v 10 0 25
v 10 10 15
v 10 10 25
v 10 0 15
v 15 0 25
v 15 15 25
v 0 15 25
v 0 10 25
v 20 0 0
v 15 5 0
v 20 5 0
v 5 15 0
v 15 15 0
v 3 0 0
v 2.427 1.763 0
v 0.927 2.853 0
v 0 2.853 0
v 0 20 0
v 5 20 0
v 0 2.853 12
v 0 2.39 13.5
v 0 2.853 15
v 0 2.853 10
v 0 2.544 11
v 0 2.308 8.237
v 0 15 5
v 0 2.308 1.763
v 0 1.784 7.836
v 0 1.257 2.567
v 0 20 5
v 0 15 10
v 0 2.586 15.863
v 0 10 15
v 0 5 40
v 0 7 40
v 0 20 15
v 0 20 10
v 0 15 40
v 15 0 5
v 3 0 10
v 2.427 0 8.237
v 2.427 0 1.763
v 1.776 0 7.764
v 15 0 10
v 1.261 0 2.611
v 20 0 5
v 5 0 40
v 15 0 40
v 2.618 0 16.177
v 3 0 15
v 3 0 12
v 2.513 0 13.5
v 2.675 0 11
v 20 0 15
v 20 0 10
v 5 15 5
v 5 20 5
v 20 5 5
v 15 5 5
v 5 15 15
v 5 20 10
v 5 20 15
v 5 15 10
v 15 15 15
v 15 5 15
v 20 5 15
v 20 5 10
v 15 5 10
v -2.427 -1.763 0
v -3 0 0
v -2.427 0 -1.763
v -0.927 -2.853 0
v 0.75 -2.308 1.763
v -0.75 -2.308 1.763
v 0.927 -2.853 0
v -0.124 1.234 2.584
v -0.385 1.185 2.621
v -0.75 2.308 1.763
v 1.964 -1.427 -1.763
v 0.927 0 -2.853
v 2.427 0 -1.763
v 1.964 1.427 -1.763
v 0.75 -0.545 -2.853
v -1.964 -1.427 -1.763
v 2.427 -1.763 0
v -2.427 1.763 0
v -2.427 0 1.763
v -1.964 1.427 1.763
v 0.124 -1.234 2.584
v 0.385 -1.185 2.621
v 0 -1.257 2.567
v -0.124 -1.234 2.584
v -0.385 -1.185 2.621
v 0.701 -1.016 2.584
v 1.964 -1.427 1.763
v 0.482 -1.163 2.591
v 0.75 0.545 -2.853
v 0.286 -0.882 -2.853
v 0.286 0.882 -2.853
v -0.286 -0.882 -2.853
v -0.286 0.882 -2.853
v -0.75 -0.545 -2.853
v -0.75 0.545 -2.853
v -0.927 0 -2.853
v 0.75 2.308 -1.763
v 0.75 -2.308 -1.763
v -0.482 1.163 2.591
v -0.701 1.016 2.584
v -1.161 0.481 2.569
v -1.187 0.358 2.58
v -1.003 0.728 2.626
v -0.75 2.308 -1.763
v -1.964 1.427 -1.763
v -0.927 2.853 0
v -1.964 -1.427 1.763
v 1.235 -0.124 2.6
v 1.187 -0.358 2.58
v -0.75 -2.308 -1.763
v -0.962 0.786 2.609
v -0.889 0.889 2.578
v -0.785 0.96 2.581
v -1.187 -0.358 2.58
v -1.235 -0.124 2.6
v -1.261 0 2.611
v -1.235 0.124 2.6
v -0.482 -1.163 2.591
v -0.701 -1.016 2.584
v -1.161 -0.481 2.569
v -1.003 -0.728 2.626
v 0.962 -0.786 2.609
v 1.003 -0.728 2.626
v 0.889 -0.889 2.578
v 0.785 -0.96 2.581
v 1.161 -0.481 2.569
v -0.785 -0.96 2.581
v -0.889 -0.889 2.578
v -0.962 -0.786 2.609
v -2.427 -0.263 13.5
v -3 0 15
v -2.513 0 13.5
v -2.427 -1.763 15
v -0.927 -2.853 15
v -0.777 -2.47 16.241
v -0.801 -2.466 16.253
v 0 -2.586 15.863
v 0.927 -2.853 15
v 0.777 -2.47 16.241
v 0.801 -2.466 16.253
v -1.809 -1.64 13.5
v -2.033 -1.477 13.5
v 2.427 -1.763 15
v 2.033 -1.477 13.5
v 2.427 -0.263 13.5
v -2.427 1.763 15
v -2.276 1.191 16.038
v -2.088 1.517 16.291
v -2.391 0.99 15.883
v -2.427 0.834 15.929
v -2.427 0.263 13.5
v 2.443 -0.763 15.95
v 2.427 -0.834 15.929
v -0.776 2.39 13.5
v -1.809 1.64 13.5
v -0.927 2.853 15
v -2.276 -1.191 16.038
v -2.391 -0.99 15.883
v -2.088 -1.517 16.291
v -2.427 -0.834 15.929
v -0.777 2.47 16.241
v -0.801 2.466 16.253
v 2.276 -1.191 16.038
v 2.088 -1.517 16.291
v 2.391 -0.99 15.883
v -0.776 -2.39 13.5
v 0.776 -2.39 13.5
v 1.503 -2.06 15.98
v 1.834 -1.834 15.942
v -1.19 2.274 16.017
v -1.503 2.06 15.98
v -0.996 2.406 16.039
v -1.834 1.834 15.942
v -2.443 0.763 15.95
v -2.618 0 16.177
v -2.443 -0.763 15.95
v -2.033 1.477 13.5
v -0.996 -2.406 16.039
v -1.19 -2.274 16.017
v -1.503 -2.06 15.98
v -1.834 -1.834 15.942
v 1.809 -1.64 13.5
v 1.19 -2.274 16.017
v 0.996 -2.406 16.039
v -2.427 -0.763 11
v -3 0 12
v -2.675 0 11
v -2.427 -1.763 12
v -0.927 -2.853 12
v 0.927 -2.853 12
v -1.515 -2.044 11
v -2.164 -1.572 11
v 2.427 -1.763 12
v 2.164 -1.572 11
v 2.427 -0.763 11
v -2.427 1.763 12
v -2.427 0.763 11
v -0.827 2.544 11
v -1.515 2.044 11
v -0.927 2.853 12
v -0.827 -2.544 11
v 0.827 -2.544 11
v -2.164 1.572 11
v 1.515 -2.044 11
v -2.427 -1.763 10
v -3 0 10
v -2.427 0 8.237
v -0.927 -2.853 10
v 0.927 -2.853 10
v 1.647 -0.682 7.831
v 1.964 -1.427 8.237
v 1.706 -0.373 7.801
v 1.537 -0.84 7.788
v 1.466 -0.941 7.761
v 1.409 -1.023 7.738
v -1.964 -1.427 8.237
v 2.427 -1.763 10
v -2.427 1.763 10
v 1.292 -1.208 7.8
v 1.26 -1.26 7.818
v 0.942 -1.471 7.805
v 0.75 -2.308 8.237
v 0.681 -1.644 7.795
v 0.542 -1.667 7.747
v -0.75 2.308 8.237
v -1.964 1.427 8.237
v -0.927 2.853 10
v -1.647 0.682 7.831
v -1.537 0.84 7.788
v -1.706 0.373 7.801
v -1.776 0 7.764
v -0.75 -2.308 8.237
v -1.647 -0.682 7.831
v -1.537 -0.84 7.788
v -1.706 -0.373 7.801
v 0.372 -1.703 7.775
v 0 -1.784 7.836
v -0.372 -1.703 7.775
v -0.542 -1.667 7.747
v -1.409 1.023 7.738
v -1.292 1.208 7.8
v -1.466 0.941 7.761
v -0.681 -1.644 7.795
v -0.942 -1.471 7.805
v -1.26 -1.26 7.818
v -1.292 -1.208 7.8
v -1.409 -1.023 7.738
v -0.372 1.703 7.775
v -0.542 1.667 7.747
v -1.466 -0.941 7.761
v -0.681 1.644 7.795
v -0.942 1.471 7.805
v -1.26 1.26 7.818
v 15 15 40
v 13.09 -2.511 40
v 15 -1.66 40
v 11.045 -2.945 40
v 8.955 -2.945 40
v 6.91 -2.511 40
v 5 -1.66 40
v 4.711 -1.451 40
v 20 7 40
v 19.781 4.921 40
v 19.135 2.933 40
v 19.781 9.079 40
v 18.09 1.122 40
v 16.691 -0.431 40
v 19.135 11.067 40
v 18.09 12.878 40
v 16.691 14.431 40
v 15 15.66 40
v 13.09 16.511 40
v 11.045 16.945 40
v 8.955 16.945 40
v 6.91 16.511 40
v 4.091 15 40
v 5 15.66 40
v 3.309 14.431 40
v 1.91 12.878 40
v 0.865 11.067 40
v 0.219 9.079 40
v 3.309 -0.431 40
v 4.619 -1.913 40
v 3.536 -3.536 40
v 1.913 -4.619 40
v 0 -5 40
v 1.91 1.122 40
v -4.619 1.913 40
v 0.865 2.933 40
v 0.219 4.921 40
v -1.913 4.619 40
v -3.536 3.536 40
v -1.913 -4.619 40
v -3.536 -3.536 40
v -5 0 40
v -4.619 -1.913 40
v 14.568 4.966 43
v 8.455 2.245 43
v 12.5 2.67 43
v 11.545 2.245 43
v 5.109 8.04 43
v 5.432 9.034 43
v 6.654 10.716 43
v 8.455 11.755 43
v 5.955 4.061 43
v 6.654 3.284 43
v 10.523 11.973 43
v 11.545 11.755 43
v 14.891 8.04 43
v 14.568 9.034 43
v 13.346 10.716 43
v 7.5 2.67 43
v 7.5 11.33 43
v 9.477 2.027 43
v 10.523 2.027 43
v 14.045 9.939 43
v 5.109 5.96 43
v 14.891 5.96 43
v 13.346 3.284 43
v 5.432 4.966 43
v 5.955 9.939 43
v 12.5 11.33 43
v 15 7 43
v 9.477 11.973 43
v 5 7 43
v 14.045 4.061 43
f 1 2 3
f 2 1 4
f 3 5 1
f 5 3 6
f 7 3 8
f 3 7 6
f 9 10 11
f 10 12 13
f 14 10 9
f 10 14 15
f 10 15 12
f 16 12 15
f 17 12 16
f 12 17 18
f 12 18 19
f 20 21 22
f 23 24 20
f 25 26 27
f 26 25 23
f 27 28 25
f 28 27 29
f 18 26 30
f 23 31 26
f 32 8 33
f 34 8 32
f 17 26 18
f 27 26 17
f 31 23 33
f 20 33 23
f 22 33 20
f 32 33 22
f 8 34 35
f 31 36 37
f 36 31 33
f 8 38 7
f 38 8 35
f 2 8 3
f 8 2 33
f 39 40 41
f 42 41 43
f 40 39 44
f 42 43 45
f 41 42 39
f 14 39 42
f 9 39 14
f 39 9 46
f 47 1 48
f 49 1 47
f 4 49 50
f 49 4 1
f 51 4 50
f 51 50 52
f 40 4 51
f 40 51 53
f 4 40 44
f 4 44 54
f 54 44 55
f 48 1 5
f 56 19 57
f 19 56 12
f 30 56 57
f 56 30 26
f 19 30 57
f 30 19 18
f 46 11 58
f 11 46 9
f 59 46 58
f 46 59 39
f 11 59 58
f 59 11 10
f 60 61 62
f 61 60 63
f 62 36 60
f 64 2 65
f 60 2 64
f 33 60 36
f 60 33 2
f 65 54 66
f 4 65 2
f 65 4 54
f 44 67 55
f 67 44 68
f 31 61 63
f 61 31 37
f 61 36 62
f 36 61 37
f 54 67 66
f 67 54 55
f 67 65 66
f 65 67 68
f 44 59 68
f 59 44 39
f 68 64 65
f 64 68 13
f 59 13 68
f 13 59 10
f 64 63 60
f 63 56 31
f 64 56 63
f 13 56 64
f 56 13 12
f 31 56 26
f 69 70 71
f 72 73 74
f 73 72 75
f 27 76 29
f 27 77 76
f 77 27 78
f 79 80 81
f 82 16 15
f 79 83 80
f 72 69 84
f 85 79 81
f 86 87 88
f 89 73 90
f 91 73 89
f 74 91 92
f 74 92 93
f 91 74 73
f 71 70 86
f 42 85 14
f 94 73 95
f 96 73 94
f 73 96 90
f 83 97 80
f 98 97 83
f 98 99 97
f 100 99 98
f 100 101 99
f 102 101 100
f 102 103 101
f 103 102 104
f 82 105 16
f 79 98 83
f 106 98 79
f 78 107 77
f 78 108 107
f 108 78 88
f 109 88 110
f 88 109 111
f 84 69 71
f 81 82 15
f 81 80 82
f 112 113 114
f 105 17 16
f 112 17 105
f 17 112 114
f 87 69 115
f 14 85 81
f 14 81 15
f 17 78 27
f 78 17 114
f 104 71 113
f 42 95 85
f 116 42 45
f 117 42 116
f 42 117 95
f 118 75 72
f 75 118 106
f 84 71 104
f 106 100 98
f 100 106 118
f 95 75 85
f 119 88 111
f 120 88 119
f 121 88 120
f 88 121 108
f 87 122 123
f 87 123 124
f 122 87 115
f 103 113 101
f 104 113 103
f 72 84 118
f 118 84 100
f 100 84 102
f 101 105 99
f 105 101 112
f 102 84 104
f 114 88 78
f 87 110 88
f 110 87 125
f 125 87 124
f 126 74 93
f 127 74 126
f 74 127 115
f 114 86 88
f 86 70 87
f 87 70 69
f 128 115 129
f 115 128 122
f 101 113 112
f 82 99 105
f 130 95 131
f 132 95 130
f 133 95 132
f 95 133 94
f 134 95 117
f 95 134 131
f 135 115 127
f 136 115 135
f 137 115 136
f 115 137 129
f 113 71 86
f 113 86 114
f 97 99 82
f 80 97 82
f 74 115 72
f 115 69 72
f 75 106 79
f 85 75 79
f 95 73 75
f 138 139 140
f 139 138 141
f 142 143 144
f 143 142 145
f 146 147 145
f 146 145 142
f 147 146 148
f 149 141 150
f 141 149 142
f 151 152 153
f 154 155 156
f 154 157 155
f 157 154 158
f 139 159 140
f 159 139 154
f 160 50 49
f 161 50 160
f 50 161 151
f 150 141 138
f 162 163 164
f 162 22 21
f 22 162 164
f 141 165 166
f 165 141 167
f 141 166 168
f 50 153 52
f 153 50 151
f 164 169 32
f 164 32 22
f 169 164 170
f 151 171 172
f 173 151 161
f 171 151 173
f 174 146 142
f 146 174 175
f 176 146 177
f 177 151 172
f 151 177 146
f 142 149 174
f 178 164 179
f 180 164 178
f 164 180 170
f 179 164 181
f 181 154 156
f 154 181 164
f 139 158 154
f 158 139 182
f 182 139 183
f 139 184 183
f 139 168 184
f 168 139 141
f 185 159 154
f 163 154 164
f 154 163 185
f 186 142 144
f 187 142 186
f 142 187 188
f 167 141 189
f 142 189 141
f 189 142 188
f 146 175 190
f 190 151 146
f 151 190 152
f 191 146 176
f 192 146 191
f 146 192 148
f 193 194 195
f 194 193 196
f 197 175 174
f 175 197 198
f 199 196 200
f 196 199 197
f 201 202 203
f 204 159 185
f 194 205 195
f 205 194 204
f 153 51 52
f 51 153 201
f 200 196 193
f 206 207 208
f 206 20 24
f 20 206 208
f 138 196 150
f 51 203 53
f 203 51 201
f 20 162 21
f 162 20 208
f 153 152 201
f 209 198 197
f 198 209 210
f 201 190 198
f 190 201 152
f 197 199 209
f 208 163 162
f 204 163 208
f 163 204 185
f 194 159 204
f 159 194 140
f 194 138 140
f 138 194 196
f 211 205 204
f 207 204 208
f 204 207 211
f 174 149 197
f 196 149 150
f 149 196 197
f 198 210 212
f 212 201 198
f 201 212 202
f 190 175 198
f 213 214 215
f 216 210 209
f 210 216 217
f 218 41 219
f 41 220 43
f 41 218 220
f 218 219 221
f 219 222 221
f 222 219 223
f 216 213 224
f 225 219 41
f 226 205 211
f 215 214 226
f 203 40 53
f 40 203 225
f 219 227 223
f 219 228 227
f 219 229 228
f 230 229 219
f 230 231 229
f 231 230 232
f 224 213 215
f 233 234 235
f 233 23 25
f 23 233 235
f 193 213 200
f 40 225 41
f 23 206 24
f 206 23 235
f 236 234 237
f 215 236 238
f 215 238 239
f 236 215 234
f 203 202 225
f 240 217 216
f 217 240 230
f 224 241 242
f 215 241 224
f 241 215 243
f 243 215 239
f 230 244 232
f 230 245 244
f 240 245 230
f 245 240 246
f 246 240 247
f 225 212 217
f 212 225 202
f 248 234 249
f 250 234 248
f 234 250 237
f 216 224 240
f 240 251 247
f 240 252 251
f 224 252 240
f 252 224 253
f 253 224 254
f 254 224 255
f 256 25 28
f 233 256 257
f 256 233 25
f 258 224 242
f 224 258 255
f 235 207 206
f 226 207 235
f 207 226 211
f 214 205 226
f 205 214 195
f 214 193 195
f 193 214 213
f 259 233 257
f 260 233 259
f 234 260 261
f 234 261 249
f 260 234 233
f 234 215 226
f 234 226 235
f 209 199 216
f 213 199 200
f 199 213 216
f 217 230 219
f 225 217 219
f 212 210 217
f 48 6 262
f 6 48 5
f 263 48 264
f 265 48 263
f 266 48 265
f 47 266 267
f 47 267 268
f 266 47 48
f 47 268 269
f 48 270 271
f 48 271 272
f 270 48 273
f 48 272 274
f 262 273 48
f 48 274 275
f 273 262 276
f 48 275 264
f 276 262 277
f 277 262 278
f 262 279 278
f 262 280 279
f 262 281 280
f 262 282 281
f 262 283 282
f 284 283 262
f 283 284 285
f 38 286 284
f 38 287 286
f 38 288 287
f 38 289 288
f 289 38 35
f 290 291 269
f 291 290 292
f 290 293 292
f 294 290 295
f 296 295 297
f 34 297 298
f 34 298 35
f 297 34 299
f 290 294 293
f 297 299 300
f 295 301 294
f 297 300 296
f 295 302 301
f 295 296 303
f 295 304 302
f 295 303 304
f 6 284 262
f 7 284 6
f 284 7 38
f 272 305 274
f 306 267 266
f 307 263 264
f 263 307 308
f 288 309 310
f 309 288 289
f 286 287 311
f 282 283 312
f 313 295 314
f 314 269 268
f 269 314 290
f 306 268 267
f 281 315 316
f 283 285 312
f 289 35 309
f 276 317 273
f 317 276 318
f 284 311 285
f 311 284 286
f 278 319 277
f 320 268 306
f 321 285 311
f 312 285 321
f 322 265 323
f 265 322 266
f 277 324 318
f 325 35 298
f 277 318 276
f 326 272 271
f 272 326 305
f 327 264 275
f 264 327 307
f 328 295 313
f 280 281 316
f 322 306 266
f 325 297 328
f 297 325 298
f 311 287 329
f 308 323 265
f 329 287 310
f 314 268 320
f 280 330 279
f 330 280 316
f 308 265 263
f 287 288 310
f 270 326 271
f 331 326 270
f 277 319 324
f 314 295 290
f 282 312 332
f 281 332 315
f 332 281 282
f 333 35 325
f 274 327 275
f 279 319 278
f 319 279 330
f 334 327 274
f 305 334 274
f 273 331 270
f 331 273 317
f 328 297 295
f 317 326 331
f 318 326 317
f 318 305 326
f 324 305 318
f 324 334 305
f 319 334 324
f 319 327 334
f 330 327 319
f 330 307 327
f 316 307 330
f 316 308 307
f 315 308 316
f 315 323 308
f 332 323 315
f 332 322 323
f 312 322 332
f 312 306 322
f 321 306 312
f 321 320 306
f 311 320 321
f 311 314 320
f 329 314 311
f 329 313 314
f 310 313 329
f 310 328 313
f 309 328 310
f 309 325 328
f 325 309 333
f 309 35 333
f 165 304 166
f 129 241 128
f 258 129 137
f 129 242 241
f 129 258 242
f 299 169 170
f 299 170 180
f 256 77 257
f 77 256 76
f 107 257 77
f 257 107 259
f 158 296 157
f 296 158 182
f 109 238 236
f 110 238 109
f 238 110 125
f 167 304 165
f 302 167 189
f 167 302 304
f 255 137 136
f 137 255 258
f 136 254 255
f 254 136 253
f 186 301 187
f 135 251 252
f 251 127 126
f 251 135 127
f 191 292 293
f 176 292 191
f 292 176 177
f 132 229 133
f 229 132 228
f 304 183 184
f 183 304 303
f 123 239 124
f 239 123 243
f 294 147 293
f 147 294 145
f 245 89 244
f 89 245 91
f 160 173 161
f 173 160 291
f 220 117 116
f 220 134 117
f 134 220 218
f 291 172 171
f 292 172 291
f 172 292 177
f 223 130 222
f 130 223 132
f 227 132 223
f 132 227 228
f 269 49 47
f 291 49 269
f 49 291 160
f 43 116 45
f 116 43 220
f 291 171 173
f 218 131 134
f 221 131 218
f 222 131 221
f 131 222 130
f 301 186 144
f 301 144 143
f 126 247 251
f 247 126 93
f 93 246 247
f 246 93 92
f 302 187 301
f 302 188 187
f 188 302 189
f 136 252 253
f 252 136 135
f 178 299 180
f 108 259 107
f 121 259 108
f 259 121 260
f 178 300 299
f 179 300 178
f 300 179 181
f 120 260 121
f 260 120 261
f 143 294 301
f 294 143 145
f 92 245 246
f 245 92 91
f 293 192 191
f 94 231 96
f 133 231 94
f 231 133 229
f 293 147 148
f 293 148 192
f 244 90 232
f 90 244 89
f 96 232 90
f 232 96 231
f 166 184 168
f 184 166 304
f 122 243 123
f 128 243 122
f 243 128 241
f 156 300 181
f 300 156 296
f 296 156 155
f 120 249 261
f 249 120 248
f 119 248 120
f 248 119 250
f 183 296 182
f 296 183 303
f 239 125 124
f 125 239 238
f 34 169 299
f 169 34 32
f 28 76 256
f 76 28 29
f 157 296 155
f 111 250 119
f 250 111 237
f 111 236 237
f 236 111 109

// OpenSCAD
cube([10, 10, 25]);
cube([5, 20, 5]);
cube([20, 5, 5]);
 translate([0, 0, 10])
cube([5, 20, 5]);
translate([0, 0, 10])
cube([20, 5, 5]);
cube([15, 15, 15]);
sphere(3);
 translate([0, 0, 15])
sphere(3);
 translate([0, 0, 12])
sphere(3);
 translate([0, 0, 10])
sphere(3);
 translate([0, 0, 25])
cube([15, 15, 15]);
cylinder([5, 5, 5]);
translate([10, 7, 40])
cylinder(3, 10, 5);
cylinder(40, 1, 5);
